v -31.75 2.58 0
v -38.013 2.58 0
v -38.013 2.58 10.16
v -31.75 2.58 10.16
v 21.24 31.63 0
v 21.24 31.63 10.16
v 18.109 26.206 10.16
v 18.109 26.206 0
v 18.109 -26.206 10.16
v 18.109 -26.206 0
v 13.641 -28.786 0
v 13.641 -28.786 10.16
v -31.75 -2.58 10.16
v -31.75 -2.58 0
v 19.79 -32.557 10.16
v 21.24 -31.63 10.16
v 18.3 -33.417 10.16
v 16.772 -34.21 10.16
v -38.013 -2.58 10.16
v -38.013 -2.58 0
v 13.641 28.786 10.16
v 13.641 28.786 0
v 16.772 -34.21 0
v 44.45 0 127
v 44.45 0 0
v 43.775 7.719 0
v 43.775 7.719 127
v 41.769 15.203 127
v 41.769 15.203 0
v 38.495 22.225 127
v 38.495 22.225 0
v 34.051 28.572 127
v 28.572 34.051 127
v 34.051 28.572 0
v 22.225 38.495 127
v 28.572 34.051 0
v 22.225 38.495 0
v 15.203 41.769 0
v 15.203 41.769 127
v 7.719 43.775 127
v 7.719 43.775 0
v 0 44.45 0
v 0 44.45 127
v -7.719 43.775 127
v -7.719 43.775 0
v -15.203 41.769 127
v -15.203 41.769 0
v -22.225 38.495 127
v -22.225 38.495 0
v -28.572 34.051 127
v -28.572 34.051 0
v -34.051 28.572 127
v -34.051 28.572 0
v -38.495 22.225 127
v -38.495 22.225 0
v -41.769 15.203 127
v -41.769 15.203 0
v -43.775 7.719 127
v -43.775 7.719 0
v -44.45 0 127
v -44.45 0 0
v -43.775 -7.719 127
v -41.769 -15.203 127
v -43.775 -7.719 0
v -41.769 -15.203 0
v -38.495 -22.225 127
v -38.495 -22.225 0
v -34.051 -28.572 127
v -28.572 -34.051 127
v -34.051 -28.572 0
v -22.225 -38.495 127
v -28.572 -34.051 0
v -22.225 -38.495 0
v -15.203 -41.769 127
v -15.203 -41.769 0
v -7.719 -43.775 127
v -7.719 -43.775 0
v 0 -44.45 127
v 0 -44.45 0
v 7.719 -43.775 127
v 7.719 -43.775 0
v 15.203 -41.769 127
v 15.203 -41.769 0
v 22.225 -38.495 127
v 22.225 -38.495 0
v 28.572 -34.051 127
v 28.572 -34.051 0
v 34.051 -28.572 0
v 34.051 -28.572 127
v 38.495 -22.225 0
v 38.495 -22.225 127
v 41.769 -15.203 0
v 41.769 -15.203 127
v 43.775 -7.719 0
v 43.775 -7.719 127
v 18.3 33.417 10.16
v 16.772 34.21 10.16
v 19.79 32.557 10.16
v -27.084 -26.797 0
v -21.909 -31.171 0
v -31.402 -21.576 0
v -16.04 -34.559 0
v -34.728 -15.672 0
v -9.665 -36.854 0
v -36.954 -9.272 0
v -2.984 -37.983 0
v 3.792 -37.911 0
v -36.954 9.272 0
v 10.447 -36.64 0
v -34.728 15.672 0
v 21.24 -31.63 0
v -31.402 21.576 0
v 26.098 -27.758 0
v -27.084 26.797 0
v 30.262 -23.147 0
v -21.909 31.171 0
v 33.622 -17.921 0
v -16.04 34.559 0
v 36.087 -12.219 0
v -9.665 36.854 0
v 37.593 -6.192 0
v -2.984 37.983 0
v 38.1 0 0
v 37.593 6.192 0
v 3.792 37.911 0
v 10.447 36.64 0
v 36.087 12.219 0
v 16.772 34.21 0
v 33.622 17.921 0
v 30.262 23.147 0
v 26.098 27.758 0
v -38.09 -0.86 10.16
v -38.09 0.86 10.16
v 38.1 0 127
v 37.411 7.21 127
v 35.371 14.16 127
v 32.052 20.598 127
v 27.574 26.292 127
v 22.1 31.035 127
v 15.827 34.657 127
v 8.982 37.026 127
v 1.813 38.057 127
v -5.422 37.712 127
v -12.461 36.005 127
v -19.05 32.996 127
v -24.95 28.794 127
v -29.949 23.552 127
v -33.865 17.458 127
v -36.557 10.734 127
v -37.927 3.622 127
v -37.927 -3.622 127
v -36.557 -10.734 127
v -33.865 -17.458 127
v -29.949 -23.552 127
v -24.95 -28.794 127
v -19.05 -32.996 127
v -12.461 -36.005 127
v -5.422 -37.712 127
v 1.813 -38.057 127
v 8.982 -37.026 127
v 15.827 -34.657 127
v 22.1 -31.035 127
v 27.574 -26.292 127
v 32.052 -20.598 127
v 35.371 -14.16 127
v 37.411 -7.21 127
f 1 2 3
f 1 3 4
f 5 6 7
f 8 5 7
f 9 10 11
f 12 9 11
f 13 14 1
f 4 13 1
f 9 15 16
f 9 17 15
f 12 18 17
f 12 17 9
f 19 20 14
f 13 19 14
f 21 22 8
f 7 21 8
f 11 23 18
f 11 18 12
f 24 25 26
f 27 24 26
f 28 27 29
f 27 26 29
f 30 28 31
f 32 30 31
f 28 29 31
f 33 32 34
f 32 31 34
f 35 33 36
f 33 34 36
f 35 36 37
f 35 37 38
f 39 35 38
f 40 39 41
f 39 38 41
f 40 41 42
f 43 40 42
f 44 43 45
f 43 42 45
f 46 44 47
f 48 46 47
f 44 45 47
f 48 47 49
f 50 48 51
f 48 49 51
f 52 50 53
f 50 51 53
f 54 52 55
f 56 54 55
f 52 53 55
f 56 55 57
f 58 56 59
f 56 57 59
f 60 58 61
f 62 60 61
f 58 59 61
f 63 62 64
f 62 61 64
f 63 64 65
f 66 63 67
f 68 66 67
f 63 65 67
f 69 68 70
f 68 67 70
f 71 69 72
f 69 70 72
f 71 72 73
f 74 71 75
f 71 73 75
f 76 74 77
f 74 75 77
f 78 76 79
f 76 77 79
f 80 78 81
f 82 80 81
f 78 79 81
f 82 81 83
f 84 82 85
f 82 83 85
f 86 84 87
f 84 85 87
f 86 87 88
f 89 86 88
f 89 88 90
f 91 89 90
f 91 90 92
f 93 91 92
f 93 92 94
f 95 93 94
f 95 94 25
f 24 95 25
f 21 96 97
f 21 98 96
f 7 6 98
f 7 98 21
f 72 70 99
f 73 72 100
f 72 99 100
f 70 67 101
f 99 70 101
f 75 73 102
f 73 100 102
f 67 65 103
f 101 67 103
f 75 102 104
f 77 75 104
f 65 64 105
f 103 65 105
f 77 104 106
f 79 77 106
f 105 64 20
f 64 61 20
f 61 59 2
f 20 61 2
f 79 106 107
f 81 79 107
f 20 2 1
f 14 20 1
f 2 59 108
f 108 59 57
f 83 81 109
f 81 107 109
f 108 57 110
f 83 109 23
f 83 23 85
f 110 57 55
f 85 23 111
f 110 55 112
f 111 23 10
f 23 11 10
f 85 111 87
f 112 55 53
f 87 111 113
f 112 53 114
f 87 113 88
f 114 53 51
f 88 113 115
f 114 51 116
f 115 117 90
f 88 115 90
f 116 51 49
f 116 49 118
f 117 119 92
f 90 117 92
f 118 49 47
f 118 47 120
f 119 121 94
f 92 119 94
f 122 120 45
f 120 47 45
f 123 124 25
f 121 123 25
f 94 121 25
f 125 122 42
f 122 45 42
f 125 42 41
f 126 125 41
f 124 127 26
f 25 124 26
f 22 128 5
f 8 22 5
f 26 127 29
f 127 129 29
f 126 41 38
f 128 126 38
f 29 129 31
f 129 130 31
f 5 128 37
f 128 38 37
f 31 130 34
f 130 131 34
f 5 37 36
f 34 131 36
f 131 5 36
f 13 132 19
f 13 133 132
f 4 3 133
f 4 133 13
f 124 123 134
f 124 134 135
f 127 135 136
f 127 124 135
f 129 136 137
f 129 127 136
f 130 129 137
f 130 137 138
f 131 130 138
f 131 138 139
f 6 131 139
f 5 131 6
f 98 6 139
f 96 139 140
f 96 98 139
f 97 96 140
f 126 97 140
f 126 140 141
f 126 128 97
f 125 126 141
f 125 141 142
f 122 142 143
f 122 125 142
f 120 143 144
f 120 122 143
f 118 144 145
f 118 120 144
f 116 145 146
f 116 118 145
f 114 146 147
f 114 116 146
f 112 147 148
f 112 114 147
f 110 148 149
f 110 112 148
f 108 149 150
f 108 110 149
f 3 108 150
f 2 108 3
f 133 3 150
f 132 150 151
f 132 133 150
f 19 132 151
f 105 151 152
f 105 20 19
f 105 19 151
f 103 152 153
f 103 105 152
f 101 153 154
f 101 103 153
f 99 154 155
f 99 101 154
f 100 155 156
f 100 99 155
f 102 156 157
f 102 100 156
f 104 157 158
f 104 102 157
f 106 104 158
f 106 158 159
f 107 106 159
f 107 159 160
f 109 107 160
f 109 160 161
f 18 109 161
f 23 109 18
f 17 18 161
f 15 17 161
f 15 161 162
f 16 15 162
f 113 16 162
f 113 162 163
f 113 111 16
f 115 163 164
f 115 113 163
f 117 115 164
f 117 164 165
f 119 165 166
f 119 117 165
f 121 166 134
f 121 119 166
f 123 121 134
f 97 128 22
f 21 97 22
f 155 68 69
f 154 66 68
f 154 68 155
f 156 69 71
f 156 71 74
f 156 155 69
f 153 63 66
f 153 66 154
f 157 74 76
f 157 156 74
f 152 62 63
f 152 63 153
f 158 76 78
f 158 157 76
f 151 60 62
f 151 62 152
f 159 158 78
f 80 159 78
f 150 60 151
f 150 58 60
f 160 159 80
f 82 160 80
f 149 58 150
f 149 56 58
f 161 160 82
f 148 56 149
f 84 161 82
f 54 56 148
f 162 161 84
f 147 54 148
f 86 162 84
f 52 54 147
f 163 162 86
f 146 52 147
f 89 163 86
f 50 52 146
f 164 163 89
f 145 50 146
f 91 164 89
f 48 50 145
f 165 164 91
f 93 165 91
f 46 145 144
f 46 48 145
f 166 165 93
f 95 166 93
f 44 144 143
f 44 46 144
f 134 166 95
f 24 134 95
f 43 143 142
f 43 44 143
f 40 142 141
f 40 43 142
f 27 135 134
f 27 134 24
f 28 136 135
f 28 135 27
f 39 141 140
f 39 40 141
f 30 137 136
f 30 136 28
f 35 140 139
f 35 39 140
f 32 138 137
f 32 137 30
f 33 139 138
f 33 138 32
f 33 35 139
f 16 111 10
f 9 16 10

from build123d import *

# Parameters (mm, degrees)
F0_R            = 44.45
F0_R_2          = 38.1
F1_DEPTH        = 127
F2_W            = 6.35
F2_H            = 5.1593752402
F3_DEPTH        = 10.16
F3_COPIES_COUNT = 3


# Not quite as in the source:
# - a pattern or mirror of a feature is missing from the dataset's text; its kind, count and spacing are read off the source's solid


with BuildPart() as f1:
    # F0 (on Top) → F1 (new body)
    with BuildSketch(Plane.XY):
        Circle(F0_R)
        Circle(F0_R_2, mode=Mode.SUBTRACT)
    extrude(amount=F1_DEPTH)

    # F2 (on Top) → F3 (join)
    with BuildSketch(Plane.XY):
        with Locations((-34.925, 0)):
            Rectangle(F2_W, F2_H)
    f3 = extrude(amount=F3_DEPTH)

    # F3_copies: F3 ×3 about axis
    f3_copies_axis = Axis((0, 0, 0), (0, 0, 1))
    for i in range(1, F3_COPIES_COUNT):
        add(f3.rotate(f3_copies_axis, i * 360 / F3_COPIES_COUNT))


solid = f1.part
